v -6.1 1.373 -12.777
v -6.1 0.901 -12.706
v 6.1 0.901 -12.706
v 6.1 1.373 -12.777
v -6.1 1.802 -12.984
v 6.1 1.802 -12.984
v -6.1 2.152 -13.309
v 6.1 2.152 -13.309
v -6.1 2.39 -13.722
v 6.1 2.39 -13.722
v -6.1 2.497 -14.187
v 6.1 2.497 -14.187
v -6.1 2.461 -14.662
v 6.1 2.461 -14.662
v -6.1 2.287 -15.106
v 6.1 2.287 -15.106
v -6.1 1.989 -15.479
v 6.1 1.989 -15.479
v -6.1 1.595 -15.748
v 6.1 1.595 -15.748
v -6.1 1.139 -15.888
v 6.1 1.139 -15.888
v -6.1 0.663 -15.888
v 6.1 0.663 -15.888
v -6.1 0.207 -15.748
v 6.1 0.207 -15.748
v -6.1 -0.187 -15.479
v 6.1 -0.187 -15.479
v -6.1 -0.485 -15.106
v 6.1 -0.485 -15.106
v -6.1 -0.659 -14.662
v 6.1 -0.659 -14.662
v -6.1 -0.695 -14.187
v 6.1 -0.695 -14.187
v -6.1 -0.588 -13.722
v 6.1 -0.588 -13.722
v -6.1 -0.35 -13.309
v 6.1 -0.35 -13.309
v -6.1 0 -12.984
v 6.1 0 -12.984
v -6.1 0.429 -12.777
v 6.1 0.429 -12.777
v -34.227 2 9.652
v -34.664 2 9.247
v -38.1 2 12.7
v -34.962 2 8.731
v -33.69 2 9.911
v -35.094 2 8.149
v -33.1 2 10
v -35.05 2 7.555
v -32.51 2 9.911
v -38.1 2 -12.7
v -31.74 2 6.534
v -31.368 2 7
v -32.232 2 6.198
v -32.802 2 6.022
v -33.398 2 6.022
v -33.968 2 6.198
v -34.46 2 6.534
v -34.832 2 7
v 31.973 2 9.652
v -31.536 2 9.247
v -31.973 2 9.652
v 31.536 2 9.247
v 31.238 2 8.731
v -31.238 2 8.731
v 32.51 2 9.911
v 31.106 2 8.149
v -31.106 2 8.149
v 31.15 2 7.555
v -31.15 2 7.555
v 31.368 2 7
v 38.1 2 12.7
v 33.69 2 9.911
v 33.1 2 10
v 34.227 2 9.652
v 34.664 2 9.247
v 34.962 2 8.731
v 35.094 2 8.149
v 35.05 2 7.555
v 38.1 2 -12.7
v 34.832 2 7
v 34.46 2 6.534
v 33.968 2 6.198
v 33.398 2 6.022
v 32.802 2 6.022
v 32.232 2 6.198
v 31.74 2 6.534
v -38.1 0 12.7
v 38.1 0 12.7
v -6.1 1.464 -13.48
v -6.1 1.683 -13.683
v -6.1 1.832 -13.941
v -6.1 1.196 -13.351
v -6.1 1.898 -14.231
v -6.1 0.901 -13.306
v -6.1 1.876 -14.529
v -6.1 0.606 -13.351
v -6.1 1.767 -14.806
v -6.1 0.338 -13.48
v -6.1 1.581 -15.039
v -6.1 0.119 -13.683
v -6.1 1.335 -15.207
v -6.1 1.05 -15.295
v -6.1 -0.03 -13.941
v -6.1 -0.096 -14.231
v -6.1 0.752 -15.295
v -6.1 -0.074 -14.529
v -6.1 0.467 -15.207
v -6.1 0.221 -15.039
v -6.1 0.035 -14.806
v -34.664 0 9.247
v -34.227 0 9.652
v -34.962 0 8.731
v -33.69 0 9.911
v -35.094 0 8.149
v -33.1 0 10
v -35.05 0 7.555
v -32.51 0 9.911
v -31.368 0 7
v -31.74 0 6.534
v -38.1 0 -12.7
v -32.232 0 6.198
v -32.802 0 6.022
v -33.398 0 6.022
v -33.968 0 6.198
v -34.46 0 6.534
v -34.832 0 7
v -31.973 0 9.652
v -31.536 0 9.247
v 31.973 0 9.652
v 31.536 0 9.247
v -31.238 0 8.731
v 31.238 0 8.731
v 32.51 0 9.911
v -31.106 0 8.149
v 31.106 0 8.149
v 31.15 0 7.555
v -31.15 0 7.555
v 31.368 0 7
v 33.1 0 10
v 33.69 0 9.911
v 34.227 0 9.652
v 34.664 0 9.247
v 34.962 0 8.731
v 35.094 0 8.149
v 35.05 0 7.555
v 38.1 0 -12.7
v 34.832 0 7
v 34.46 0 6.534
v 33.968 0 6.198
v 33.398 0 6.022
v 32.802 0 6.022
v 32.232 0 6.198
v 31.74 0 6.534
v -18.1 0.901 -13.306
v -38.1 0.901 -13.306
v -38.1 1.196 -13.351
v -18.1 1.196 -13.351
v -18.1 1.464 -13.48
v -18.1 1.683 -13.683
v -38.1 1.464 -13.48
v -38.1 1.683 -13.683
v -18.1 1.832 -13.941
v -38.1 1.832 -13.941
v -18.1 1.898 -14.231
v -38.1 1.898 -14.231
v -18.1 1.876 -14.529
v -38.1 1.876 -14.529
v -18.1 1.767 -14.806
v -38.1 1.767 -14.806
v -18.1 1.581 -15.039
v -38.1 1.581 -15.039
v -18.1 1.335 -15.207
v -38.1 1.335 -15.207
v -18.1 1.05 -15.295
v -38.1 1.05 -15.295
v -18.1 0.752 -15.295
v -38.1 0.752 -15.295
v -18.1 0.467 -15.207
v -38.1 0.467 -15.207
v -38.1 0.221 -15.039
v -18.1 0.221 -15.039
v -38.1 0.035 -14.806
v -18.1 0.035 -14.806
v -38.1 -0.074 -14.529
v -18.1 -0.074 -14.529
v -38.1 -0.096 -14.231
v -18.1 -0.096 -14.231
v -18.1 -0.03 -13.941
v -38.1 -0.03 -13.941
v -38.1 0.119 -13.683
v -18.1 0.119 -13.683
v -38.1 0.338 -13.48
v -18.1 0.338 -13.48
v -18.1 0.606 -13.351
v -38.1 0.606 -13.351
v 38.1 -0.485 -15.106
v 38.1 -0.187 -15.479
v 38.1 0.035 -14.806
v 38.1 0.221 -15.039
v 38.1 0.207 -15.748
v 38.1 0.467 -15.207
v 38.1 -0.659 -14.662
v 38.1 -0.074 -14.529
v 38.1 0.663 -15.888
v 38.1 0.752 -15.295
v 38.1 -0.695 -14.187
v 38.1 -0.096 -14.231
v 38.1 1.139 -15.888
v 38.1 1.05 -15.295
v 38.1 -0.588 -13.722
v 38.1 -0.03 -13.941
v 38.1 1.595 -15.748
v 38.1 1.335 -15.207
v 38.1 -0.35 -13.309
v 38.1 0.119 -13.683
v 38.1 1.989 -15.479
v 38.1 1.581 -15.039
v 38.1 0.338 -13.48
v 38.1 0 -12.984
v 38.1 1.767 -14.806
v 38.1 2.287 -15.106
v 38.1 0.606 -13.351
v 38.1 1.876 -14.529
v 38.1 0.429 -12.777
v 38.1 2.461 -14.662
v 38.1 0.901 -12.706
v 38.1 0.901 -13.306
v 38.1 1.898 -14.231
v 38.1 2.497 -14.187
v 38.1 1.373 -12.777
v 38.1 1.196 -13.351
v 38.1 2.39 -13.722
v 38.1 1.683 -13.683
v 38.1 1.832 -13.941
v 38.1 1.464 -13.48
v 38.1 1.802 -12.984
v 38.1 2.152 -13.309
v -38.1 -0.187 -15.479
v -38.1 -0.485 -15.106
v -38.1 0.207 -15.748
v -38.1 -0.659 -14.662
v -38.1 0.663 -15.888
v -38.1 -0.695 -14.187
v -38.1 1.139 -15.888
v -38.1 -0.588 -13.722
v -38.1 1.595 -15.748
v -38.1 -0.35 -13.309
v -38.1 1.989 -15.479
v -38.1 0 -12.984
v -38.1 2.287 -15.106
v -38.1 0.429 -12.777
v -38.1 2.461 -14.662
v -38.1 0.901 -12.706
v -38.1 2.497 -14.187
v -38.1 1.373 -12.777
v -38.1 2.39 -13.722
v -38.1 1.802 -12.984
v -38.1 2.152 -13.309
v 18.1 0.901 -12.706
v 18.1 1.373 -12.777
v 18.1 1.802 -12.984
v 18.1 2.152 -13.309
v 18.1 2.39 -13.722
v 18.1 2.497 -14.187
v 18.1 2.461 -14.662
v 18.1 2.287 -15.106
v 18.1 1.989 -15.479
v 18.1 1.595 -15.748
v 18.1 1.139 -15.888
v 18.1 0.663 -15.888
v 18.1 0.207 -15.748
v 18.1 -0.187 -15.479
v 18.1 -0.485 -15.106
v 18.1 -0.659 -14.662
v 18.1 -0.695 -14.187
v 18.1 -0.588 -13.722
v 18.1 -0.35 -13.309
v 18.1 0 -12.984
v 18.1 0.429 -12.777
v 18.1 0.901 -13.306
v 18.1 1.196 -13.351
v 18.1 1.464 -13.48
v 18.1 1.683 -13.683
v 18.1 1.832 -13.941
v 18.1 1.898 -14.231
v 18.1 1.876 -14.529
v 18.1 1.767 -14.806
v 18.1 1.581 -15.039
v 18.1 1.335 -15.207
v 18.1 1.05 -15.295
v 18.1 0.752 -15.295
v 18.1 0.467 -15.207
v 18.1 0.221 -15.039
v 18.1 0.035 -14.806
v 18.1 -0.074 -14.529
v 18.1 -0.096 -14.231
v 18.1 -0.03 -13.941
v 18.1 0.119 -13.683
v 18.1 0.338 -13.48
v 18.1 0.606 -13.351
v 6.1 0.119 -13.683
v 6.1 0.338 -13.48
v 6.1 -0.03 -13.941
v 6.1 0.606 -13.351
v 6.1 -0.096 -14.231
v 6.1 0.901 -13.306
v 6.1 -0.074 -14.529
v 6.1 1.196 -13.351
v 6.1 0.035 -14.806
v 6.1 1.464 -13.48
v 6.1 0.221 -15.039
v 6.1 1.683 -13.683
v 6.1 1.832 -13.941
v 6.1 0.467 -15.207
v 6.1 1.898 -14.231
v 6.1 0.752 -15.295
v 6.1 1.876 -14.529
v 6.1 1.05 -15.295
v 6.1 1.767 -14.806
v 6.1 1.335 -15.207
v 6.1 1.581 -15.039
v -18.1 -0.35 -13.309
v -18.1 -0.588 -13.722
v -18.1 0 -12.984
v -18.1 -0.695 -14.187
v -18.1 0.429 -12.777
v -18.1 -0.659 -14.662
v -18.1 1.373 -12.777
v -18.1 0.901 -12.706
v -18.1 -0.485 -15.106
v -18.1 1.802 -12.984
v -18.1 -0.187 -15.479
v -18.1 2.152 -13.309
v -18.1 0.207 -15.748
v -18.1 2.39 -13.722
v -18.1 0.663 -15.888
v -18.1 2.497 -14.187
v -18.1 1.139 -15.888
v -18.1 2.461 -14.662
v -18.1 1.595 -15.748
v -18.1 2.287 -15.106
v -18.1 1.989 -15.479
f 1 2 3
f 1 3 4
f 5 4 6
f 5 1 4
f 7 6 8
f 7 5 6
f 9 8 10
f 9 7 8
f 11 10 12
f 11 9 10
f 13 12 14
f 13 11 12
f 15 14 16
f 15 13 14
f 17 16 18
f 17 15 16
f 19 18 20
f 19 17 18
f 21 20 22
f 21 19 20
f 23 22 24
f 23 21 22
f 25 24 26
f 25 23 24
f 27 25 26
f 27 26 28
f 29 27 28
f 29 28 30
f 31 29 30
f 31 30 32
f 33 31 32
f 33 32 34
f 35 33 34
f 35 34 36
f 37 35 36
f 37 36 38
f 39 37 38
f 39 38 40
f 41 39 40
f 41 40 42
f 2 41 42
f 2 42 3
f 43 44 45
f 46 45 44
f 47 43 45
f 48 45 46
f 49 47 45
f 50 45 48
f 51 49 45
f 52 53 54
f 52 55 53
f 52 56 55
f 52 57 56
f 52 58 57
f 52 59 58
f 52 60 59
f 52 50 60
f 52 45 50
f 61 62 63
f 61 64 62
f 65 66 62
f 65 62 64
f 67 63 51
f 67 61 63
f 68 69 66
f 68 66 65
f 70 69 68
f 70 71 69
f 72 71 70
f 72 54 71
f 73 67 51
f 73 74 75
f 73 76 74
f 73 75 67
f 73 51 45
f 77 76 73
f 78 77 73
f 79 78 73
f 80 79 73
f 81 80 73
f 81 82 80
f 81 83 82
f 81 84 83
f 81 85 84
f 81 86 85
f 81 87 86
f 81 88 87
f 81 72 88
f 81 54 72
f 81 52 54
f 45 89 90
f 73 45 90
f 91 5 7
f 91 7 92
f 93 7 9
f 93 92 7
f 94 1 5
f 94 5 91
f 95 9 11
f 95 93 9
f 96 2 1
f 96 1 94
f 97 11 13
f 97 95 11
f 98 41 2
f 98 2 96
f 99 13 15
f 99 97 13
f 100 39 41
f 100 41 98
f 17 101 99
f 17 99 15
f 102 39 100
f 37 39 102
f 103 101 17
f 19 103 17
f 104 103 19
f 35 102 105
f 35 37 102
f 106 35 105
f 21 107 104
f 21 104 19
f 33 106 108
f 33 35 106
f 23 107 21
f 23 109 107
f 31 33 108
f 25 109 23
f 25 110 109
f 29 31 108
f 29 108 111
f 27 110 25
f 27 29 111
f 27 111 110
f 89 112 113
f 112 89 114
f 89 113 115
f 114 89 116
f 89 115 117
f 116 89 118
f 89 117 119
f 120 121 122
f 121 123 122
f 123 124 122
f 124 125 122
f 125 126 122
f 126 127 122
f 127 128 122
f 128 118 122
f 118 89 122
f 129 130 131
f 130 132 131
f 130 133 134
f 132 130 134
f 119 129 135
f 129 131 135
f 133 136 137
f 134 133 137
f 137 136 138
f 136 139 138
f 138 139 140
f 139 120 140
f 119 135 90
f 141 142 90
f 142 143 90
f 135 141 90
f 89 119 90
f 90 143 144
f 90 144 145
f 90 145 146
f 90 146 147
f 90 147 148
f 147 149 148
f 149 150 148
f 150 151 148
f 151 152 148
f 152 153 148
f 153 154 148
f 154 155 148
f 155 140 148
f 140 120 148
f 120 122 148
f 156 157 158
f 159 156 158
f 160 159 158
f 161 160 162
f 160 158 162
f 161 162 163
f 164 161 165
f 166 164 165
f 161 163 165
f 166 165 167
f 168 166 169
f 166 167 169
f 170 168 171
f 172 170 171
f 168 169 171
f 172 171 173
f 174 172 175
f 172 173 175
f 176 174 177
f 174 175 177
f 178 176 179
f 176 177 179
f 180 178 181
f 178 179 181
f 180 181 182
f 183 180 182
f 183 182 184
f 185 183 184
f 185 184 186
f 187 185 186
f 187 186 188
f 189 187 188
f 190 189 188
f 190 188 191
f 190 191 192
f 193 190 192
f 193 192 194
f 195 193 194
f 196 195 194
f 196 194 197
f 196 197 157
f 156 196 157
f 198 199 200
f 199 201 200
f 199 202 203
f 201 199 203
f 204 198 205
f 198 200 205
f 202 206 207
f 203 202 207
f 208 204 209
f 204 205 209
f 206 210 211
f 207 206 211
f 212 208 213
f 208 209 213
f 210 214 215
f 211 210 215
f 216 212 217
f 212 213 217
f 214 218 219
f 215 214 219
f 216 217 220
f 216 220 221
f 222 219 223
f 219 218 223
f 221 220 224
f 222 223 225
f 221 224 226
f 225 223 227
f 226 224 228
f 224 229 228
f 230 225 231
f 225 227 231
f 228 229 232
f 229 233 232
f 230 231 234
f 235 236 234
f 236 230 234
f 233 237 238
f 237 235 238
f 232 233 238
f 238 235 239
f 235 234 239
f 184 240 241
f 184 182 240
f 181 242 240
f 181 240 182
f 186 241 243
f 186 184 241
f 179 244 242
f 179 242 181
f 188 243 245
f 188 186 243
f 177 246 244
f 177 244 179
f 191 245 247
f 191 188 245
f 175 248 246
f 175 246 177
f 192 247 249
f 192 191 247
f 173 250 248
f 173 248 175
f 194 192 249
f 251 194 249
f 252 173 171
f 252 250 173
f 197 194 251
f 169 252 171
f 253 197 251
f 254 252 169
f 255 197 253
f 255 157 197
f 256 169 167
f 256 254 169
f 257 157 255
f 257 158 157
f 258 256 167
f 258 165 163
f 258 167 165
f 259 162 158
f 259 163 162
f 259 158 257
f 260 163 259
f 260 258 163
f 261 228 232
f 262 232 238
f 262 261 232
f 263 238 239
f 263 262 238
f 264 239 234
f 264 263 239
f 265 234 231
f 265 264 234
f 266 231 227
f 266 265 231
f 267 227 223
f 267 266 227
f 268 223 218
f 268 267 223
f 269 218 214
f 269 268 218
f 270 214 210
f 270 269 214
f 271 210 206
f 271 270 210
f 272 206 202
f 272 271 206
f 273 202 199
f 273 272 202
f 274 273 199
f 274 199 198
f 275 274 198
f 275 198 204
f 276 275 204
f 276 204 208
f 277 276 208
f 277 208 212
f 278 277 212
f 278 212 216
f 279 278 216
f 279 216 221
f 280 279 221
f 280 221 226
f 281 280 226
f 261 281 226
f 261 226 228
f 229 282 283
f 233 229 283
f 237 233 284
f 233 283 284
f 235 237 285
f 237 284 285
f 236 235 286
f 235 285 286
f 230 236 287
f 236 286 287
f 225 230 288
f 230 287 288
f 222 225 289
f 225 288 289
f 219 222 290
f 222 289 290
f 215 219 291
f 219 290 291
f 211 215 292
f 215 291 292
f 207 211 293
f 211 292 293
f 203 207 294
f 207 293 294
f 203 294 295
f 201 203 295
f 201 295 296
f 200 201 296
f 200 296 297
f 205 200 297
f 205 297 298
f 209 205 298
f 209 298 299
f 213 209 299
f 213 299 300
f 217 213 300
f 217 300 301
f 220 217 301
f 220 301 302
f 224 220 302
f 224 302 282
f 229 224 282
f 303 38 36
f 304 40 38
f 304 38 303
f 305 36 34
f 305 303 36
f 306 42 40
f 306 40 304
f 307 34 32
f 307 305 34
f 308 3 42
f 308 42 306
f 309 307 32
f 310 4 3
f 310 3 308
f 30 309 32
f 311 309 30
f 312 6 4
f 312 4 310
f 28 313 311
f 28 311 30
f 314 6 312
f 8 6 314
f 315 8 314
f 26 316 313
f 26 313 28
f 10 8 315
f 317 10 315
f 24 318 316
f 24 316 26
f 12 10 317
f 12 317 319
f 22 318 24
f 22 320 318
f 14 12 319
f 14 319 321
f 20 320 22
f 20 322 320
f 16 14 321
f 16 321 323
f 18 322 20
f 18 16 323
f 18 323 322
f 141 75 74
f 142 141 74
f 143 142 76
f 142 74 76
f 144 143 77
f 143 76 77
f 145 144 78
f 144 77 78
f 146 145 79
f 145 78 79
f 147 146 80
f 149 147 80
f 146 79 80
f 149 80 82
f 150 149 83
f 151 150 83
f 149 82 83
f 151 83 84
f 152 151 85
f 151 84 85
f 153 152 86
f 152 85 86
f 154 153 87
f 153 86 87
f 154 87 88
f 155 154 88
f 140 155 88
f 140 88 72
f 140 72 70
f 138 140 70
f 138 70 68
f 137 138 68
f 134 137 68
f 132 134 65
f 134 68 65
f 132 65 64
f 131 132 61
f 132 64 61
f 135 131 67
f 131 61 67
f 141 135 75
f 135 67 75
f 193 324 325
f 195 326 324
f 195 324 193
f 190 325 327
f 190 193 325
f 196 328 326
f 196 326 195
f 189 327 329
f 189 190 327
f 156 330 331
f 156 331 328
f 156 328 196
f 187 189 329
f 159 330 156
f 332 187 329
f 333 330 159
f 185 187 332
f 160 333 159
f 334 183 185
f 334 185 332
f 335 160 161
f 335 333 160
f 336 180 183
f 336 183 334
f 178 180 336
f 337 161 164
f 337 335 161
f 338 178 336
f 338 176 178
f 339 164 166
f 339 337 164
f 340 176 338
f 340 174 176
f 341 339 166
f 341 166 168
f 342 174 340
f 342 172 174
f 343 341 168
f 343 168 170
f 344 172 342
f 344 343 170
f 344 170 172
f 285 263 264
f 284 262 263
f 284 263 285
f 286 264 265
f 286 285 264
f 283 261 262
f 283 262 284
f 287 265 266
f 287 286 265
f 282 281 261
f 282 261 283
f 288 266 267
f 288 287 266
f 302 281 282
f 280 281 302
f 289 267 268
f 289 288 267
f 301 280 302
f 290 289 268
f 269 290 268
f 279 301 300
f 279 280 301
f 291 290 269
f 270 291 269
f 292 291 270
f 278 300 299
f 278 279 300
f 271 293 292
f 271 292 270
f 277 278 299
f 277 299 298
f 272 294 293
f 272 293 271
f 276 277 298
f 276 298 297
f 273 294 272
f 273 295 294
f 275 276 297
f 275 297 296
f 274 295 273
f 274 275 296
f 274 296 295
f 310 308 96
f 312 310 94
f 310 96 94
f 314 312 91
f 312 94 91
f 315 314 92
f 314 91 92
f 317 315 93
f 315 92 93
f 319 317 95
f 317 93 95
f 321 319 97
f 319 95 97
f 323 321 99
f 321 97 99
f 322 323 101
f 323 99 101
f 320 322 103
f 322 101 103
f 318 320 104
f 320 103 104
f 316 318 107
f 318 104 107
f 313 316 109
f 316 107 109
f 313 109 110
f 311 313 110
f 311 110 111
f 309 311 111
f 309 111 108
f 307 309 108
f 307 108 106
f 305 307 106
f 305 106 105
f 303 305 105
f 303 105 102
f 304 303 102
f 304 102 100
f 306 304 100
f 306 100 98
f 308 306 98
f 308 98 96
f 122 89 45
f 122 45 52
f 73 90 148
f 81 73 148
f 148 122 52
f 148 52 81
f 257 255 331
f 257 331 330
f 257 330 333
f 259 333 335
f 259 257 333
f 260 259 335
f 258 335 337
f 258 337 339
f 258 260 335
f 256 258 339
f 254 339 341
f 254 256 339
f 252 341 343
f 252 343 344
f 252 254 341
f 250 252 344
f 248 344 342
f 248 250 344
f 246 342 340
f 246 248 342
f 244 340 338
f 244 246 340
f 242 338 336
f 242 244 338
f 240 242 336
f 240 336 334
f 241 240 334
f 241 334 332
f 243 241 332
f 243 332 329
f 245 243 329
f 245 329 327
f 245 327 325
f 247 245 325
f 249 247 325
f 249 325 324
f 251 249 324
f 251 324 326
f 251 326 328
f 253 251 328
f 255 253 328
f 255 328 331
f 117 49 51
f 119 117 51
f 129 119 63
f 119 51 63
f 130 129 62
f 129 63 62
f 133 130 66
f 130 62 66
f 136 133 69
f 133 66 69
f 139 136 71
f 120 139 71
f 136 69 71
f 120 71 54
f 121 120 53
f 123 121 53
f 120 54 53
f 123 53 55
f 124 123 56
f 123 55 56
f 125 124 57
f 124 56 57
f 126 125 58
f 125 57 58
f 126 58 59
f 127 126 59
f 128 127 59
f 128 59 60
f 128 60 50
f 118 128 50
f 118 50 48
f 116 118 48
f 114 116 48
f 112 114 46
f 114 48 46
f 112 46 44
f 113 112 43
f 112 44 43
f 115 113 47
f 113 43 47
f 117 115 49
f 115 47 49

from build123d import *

# Parameters (mm, degrees)
CROQUIS1_W                        = 76.2
CROQUIS1_H                        = 25.4
SALIENTE_EXTRUIR1_DEPTH           = 2
CROQUIS2_R                        = 1.6
SALIENTE_EXTRUIR2_DEPTH           = 76.2
CROQUIS3_R                        = 2
CORTAR_EXTRUIR1_DEPTH             = 2
CROQUIS4_R                        = 1
CORTAR_EXTRUIR2_DEPTH             = 76.2
CORTAR_EXTRUIR4_REACH             = 43.375
CROQUIS5_W                        = 12
CROQUIS5_H                        = 1.6
CROQUIS5_H_2                      = 3.2
CORTAR_EXTRUIR4_DIRECTION_2_REACH = 43.375


with BuildPart() as part:
    # Croquis1 → Saliente-Extruir1 (new body)
    with BuildSketch(Plane(origin=(0, 0, 0), x_dir=(1, 0, 0), z_dir=(0, 1, 0))):
        Rectangle(CROQUIS1_W, CROQUIS1_H)
    extrude(amount=SALIENTE_EXTRUIR1_DEPTH)

    # Croquis3 → Cortar-Extruir1 (cut)
    with BuildSketch(Plane(origin=(0, 2, 0), x_dir=(1, 0, 0), z_dir=(0, 1, 0))):
        with Locations(Location((-33.1, -8, 0), (0, 0, 270))):
            Circle(CROQUIS3_R)
        with Locations(Location((33.1, -8, 0), (0, 0, 270))):
            Circle(CROQUIS3_R)
    extrude(amount=-CORTAR_EXTRUIR1_DEPTH, mode=Mode.SUBTRACT)


with BuildPart() as body_2:
    # Croquis2 → Saliente-Extruir2 (new body)
    with BuildSketch(Plane.ZY.offset(38.1)):
        with Locations((-14.306180295, 0.901009784)):
            Circle(CROQUIS2_R)
    extrude(amount=-SALIENTE_EXTRUIR2_DEPTH)

    # Croquis4 → Cortar-Extruir2 (cut)
    with BuildSketch(Plane.ZY.offset(38.1)):
        with Locations((-14.306180295, 0.901009784)):
            Circle(CROQUIS4_R)
    extrude(amount=-CORTAR_EXTRUIR2_DEPTH, mode=Mode.SUBTRACT)

    # Croquis5 → Cortar-Extruir4 (cut, up to next)
    with BuildSketch(Plane(origin=(0, 2, 0), x_dir=(1, 0, 0), z_dir=(0, 1, 0)), mode=Mode.PRIVATE) as cortar_extruir4_sk1:
        with Locations((12.1, 15.106180295)):
            Rectangle(CROQUIS5_W, CROQUIS5_H)
    cortar_extruir4_tool1 = extrude(cortar_extruir4_sk1.sketch, amount=-CORTAR_EXTRUIR4_REACH, mode=Mode.PRIVATE) & body_2.part
    # Croquis5 → Cortar-Extruir4 (cut, up to next)
    with BuildSketch(Plane(origin=(0, 2, 0), x_dir=(1, 0, 0), z_dir=(0, 1, 0)), mode=Mode.PRIVATE) as cortar_extruir4_sk2:
        with Locations((12.1, 13.506180295)):
            Rectangle(CROQUIS5_W, CROQUIS5_H)
    cortar_extruir4_tool2 = extrude(cortar_extruir4_sk2.sketch, amount=-CORTAR_EXTRUIR4_REACH, mode=Mode.PRIVATE) & body_2.part
    # Croquis5 → Cortar-Extruir4 (cut, up to next)
    with BuildSketch(Plane(origin=(0, 2, 0), x_dir=(1, 0, 0), z_dir=(0, 1, 0)), mode=Mode.PRIVATE) as cortar_extruir4_sk3:
        with Locations((-12.1, 14.306180295)):
            Rectangle(CROQUIS5_W, CROQUIS5_H_2)
    cortar_extruir4_tool3 = extrude(cortar_extruir4_sk3.sketch, amount=-CORTAR_EXTRUIR4_REACH, mode=Mode.PRIVATE) & body_2.part
    add(cortar_extruir4_tool1.solids().sort_by_distance((12.1, 2, -15.10618))[0], mode=Mode.SUBTRACT)
    add(cortar_extruir4_tool2.solids().sort_by_distance((12.1, 2, -13.50618))[0], mode=Mode.SUBTRACT)
    add(cortar_extruir4_tool3.solids().sort_by_distance((-12.1, 2, -14.30618))[0], mode=Mode.SUBTRACT)

    # Croquis5 → Cortar-Extruir4 direction 2 (cut, up to next)
    with BuildSketch(Plane(origin=(0, 2, 0), x_dir=(1, 0, 0), z_dir=(0, 1, 0)), mode=Mode.PRIVATE) as cortar_extruir4_direction_2_sk1:
        with Locations((12.1, 15.106180295)):
            Rectangle(CROQUIS5_W, CROQUIS5_H)
    cortar_extruir4_direction_2_tool1 = extrude(cortar_extruir4_direction_2_sk1.sketch, amount=CORTAR_EXTRUIR4_DIRECTION_2_REACH, mode=Mode.PRIVATE) & body_2.part
    # Croquis5 → Cortar-Extruir4 direction 2 (cut, up to next)
    with BuildSketch(Plane(origin=(0, 2, 0), x_dir=(1, 0, 0), z_dir=(0, 1, 0)), mode=Mode.PRIVATE) as cortar_extruir4_direction_2_sk2:
        with Locations((12.1, 13.506180295)):
            Rectangle(CROQUIS5_W, CROQUIS5_H)
    cortar_extruir4_direction_2_tool2 = extrude(cortar_extruir4_direction_2_sk2.sketch, amount=CORTAR_EXTRUIR4_DIRECTION_2_REACH, mode=Mode.PRIVATE) & body_2.part
    # Croquis5 → Cortar-Extruir4 direction 2 (cut, up to next)
    with BuildSketch(Plane(origin=(0, 2, 0), x_dir=(1, 0, 0), z_dir=(0, 1, 0)), mode=Mode.PRIVATE) as cortar_extruir4_direction_2_sk3:
        with Locations((-12.1, 14.306180295)):
            Rectangle(CROQUIS5_W, CROQUIS5_H_2)
    cortar_extruir4_direction_2_tool3 = extrude(cortar_extruir4_direction_2_sk3.sketch, amount=CORTAR_EXTRUIR4_DIRECTION_2_REACH, mode=Mode.PRIVATE) & body_2.part
    add(cortar_extruir4_direction_2_tool1.solids().sort_by_distance((12.1, 2, -15.10618))[0], mode=Mode.SUBTRACT)
    add(cortar_extruir4_direction_2_tool2.solids().sort_by_distance((12.1, 2, -13.50618))[0], mode=Mode.SUBTRACT)
    add(cortar_extruir4_direction_2_tool3.solids().sort_by_distance((-12.1, 2, -14.30618))[0], mode=Mode.SUBTRACT)


with BuildPart() as cortar_extruir4_piece_1:
    # of the separate pieces the step leaves, piece 1, a body of its own (cortar_extruir4_pieces)
    add(body_2.part.solids().sort_by_distance((-38.1, 0.901009784, -12.706180295))[0])


with BuildPart() as cortar_extruir4_piece_2:
    # of the separate pieces the step leaves, piece 2, a body of its own (cortar_extruir4_pieces)
    add(body_2.part.solids().sort_by_distance((18.1, 0.901009784, -12.706180295))[0])


with BuildPart() as cortar_extruir4_piece_3:
    # of the separate pieces the step leaves, piece 3, a body of its own (cortar_extruir4_pieces)
    add(body_2.part.solids().sort_by_distance((-6.1, 0.901009784, -12.706180295))[0])


solid = Compound([part.part, cortar_extruir4_piece_1.part, cortar_extruir4_piece_2.part, cortar_extruir4_piece_3.part])
